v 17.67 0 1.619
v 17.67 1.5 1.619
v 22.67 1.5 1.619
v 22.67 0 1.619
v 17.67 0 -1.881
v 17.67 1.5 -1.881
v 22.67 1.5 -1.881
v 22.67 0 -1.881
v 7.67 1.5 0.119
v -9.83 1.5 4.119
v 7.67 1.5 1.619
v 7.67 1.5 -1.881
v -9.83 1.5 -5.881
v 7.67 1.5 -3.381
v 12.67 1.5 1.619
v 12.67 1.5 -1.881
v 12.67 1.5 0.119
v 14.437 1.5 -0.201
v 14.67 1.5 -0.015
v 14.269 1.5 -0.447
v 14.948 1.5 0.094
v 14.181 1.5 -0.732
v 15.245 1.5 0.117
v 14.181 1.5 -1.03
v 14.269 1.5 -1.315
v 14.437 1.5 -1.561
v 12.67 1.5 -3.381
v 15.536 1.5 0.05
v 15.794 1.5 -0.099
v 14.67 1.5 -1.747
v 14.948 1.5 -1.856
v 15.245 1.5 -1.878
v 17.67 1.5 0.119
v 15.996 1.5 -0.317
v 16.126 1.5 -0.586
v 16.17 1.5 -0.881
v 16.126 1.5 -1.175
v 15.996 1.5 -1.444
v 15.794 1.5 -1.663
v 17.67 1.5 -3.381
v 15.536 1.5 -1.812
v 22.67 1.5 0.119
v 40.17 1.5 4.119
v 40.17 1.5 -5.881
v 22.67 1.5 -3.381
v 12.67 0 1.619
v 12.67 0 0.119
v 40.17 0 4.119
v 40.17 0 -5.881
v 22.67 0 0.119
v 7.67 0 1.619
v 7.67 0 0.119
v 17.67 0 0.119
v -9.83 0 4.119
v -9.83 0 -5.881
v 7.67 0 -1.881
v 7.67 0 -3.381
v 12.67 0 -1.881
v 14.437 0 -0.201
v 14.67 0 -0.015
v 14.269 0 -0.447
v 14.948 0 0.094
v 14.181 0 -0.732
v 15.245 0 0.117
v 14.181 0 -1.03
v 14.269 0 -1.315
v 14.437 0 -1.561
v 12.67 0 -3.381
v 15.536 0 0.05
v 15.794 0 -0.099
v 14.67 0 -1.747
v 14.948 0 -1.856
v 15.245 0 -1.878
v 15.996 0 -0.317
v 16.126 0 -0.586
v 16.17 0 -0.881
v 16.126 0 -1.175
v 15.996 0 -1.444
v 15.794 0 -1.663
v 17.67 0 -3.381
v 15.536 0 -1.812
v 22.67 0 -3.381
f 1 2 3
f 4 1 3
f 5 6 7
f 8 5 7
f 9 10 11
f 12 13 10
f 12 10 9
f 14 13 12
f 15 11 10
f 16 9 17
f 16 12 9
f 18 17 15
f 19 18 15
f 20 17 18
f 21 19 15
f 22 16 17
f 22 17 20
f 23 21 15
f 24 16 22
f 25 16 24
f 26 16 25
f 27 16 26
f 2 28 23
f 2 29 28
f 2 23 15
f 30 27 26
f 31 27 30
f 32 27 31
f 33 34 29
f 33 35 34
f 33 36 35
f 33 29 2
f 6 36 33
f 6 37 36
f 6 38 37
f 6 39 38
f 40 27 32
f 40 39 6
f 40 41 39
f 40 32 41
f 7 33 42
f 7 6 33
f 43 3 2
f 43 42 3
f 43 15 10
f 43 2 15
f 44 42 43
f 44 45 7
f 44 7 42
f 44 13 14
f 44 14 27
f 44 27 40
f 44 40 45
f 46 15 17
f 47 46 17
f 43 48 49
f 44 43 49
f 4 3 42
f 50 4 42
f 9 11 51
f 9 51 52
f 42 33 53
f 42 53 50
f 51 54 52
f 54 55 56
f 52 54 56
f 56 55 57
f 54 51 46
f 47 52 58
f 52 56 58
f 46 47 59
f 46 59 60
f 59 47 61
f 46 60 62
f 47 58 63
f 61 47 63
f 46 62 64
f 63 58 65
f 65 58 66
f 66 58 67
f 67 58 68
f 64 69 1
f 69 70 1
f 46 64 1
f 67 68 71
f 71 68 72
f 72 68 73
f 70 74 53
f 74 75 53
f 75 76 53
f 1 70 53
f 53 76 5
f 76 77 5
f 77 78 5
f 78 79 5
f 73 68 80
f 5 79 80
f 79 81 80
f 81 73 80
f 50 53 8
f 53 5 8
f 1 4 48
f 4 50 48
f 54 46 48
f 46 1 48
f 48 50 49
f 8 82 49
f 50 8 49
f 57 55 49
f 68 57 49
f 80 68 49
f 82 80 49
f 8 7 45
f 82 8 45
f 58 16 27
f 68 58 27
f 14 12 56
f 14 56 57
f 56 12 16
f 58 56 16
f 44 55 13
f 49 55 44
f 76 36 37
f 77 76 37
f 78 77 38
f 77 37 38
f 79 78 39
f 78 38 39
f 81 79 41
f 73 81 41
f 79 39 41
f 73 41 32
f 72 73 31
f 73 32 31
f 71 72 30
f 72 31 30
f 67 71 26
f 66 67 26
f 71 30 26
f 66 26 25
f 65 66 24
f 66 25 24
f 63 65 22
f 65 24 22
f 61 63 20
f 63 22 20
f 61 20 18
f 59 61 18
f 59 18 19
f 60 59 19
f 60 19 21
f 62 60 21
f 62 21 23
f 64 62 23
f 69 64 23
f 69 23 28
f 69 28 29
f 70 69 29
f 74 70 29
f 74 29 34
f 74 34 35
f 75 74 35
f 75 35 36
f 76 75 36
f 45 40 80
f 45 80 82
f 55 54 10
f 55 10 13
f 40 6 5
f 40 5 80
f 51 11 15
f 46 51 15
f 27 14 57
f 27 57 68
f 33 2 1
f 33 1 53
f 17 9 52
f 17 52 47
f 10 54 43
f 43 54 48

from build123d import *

# Parameters (mm, degrees)
SKETCH1_W           = 50
SKETCH1_H           = 10
BOSS_EXTRUDE1_DEPTH = 1.5
SKETCH3_W           = 5
SKETCH3_H           = 1.5
CUT_EXTRUDE1_DEPTH  = 2
SKETCH2_R           = 1
CUT_EXTRUDE2_DEPTH  = 2


with BuildPart() as part:
    # Sketch1 → Boss-Extrude1 (new body)
    with BuildSketch(Plane(origin=(0, 0, 0), x_dir=(1, 0, 0), z_dir=(0, 1, 0))):
        with Locations((15.170187286, 0.880693734)):
            Rectangle(SKETCH1_W, SKETCH1_H)
    extrude(amount=BOSS_EXTRUDE1_DEPTH)

    # Sketch3 → Cut-Extrude1 (cut)
    with BuildSketch(Plane(origin=(0, 1.5, 0), x_dir=(1, 0, 0), z_dir=(0, 1, 0))):
        with Locations((10.170187286, 2.630693734)):
            Rectangle(SKETCH3_W, SKETCH3_H)
        with Locations((20.170187286, 2.630693734)):
            Rectangle(SKETCH3_W, SKETCH3_H)
        with Locations((20.170187286, -0.869306266)):
            Rectangle(SKETCH3_W, SKETCH3_H)
        with Locations((10.170187286, -0.869306266)):
            Rectangle(SKETCH3_W, SKETCH3_H)
    extrude(amount=-CUT_EXTRUDE1_DEPTH, mode=Mode.SUBTRACT)

    # Sketch2 → Cut-Extrude2 (cut)
    with BuildSketch(Plane(origin=(0, 1.5, 0), x_dir=(1, 0, 0), z_dir=(0, 1, 0))):
        with Locations((15.170187286, 0.880693734)):
            Circle(SKETCH2_R)
    extrude(amount=-CUT_EXTRUDE2_DEPTH, mode=Mode.SUBTRACT)


solid = part.part
